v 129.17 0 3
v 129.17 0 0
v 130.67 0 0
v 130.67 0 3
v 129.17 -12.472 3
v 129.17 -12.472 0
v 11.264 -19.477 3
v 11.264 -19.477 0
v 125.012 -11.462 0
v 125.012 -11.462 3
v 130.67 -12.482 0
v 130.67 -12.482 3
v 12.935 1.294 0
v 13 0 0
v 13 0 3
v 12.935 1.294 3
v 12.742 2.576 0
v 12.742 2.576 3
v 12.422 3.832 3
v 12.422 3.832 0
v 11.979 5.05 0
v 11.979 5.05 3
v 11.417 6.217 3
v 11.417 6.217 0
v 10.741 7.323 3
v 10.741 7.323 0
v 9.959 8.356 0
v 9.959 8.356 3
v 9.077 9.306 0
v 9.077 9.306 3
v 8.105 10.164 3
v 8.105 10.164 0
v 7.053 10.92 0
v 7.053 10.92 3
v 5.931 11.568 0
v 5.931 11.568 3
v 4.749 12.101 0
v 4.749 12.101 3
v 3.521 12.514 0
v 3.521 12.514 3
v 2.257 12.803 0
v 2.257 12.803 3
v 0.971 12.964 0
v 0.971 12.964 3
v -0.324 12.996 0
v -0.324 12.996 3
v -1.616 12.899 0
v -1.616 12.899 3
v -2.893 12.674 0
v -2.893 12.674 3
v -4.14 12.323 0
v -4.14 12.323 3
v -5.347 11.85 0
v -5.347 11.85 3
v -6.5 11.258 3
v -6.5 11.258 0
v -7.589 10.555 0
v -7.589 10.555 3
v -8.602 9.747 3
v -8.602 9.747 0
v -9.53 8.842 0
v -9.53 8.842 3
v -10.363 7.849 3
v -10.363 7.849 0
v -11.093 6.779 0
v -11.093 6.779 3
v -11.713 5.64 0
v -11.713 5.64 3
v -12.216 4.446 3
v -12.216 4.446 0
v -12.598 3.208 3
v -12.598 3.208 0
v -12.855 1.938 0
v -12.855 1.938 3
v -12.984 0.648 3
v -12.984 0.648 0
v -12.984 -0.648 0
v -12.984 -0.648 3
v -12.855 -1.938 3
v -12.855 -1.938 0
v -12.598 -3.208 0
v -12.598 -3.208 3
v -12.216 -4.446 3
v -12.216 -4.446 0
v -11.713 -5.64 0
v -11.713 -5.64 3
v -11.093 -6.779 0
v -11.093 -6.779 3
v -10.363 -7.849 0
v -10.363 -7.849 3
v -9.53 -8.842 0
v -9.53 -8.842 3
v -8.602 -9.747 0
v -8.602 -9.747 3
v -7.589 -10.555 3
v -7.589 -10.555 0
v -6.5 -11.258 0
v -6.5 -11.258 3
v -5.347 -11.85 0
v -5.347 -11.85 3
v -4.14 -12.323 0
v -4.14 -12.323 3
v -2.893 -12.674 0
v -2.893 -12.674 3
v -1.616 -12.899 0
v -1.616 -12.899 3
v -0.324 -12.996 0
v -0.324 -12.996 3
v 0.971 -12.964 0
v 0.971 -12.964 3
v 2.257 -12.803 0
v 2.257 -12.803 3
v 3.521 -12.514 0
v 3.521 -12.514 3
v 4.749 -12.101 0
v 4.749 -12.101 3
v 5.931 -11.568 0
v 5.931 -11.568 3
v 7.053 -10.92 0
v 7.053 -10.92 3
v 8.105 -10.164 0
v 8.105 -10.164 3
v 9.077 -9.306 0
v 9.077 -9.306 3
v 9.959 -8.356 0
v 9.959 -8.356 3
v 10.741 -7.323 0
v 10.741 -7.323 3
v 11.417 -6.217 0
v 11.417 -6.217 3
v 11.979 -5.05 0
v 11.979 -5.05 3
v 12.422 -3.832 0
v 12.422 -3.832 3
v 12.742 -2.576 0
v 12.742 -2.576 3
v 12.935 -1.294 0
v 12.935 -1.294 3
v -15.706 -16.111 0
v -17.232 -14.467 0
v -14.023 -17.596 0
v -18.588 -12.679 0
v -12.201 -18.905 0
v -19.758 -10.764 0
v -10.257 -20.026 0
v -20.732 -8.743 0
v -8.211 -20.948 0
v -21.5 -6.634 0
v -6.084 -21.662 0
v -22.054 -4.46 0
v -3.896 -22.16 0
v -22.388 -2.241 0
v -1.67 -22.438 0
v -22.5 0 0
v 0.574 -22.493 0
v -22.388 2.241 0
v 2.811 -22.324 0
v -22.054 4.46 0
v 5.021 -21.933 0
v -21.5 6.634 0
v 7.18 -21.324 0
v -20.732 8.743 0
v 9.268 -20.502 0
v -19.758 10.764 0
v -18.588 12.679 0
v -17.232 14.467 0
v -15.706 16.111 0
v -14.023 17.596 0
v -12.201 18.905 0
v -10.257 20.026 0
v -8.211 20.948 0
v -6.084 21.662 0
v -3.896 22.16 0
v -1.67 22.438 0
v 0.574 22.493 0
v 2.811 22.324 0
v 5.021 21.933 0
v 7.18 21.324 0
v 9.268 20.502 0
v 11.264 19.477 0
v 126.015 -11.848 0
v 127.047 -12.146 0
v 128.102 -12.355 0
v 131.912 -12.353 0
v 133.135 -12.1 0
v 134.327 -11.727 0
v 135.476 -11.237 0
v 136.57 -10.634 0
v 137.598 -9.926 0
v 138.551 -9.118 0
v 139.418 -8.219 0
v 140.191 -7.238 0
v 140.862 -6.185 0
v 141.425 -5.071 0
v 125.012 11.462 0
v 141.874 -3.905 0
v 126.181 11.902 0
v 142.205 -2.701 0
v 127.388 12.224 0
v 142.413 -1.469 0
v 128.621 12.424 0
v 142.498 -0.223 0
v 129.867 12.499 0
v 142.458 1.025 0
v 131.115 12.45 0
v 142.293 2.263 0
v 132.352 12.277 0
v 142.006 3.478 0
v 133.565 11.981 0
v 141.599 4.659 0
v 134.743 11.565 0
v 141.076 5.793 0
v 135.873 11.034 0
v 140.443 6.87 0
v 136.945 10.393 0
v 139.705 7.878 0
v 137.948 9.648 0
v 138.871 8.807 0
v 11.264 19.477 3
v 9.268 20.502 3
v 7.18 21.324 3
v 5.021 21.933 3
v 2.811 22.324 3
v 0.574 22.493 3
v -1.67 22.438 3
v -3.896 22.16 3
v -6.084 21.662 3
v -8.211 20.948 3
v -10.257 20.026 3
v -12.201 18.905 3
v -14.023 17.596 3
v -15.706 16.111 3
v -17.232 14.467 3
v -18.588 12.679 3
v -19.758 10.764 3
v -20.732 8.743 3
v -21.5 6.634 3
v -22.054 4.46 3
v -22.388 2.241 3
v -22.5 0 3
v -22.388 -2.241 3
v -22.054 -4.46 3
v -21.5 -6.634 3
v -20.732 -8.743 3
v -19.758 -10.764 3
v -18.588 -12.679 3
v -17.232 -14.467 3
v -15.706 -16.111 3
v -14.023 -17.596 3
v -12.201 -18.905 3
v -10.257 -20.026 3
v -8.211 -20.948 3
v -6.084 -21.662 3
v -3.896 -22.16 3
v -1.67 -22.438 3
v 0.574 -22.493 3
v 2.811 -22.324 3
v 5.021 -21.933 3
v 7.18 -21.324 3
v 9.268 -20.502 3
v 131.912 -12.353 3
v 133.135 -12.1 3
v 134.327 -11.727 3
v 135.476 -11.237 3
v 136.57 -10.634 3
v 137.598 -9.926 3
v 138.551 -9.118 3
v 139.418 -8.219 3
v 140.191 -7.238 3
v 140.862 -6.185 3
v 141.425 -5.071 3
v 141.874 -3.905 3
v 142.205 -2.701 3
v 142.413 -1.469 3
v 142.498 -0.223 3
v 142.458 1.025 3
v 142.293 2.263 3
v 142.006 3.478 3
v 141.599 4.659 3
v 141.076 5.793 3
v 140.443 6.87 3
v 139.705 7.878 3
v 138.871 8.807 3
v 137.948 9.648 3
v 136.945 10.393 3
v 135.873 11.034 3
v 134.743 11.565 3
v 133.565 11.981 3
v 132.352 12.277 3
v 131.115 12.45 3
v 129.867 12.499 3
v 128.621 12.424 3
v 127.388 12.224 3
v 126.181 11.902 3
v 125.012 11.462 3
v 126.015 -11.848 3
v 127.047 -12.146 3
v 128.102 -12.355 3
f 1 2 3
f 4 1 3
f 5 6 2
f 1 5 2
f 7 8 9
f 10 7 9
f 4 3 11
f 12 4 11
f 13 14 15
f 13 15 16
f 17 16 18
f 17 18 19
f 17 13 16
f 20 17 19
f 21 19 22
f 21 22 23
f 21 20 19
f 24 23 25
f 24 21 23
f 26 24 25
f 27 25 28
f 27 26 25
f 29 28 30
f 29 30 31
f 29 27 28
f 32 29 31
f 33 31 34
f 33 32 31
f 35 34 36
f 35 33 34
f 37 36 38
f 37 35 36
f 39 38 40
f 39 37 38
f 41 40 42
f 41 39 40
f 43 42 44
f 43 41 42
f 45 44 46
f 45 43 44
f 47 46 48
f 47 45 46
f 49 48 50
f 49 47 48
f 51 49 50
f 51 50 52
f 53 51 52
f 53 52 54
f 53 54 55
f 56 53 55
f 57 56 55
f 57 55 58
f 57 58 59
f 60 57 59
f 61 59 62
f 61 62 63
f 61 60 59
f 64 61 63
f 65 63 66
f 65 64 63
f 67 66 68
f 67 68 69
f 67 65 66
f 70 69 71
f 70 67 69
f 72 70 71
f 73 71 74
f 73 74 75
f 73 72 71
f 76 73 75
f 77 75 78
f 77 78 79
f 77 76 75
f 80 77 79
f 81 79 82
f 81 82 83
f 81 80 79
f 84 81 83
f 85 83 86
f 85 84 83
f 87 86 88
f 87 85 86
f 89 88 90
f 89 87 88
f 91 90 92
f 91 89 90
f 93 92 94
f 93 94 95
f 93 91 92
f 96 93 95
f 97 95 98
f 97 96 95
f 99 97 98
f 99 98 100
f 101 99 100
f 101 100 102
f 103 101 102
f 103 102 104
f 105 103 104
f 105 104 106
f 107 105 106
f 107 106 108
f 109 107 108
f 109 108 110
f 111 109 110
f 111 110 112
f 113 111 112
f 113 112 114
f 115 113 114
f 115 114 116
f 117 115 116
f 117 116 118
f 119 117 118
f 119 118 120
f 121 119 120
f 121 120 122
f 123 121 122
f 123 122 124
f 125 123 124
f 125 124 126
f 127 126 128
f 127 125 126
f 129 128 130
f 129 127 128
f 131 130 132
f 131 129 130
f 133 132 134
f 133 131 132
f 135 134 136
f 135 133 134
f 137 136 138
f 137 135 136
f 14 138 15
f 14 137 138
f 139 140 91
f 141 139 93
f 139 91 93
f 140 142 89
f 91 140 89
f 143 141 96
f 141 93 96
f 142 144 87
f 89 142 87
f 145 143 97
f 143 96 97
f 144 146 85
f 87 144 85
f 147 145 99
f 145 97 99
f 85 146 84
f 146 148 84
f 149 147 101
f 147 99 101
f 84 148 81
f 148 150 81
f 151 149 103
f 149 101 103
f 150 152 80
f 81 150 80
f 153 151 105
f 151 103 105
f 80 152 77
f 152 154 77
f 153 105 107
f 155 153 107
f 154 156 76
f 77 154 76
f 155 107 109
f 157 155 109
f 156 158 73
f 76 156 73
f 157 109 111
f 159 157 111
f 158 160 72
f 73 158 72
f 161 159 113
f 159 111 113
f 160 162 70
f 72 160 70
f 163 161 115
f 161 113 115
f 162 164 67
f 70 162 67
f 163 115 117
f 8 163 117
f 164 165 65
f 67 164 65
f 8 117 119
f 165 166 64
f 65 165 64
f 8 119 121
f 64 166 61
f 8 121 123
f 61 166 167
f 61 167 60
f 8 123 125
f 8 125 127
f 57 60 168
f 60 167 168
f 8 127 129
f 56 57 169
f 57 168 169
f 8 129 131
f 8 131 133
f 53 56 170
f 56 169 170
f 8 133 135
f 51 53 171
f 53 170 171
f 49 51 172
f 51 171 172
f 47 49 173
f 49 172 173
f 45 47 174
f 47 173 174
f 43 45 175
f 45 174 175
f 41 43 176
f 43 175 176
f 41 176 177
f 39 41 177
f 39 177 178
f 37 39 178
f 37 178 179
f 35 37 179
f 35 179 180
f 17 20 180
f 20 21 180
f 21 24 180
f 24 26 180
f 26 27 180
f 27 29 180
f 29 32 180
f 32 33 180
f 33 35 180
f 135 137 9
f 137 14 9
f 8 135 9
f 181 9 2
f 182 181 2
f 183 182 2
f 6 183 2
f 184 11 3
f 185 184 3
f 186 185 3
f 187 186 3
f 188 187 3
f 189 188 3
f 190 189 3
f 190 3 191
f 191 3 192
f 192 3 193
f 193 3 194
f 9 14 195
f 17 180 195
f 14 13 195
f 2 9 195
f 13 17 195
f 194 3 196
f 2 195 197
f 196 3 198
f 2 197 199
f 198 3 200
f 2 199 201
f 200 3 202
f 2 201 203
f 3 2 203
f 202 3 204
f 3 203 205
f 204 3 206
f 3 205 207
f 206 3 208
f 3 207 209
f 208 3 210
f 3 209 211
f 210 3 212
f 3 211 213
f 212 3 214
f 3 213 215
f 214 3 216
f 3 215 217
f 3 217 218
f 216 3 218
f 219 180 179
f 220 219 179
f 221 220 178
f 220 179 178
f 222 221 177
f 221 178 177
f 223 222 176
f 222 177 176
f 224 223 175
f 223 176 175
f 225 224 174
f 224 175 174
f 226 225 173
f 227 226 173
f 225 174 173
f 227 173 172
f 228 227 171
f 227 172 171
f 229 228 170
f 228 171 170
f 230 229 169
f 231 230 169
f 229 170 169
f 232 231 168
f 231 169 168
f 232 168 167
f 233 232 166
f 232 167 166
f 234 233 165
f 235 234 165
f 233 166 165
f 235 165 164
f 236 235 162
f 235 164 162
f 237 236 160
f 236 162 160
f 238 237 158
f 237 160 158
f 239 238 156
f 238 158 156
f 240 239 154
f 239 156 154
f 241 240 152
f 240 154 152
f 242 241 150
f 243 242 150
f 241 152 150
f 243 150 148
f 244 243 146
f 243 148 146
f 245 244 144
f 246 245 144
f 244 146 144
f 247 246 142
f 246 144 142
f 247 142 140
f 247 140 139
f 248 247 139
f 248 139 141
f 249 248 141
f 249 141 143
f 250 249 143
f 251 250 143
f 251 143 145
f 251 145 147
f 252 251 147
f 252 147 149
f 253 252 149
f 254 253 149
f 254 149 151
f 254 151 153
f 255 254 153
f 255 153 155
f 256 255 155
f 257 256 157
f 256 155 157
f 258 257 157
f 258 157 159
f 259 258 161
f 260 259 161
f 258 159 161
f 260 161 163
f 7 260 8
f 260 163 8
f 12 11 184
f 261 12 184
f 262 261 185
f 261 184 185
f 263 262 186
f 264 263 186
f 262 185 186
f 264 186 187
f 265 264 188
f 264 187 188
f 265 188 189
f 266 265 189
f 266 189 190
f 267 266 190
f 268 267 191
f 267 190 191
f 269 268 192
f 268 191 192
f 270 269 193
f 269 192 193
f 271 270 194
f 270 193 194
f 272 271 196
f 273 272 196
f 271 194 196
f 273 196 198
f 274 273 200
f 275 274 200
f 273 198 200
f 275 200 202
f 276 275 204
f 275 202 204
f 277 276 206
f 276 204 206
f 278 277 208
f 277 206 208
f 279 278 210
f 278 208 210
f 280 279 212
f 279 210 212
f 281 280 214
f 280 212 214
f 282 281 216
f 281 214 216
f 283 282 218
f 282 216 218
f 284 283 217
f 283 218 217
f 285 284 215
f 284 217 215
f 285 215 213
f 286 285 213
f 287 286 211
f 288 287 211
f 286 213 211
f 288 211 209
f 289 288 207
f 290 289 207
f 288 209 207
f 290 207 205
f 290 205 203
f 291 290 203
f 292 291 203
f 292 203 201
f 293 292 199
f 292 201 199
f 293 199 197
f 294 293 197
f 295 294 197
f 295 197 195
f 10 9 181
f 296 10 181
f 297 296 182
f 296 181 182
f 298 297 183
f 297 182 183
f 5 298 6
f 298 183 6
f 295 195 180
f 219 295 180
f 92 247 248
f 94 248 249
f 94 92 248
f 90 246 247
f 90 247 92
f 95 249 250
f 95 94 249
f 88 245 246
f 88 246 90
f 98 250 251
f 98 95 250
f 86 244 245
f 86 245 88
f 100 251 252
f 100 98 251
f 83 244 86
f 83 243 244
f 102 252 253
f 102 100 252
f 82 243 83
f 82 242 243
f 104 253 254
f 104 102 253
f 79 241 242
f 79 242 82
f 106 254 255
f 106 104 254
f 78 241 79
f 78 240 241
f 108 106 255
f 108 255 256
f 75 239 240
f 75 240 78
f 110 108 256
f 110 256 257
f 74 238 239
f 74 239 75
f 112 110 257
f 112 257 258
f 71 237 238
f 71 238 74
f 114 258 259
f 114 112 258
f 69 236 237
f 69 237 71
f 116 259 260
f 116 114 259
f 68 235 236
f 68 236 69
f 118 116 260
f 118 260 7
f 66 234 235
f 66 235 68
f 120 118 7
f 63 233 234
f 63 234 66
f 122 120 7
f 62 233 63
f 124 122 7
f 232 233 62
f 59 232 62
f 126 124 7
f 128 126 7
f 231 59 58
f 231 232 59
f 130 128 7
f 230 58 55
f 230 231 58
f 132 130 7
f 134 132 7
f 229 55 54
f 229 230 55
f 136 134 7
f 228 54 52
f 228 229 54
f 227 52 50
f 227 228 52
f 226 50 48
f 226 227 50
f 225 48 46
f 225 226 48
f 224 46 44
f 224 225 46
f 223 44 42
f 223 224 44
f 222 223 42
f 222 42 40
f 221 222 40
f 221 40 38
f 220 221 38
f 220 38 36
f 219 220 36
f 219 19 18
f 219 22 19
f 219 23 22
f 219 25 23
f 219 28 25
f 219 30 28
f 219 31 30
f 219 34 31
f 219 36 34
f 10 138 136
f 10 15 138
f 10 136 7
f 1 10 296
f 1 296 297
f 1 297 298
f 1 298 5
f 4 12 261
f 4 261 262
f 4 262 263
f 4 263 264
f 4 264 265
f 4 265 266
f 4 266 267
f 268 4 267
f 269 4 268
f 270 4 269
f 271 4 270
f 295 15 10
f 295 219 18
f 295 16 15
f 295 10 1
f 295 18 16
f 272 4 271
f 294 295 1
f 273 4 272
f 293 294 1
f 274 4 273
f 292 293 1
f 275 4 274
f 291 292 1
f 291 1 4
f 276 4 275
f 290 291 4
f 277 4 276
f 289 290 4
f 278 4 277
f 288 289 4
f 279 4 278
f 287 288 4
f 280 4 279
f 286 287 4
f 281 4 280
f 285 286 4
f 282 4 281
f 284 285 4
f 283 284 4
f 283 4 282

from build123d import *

# Parameters (mm, degrees)
SKETCH1_R           = 13
BOSS_EXTRUDE1_DEPTH = 3


with BuildPart() as part:
    # Sketch1 → Boss-Extrude1 (new body)
    with BuildSketch(Plane.XY):
        with BuildLine():
            Line((125.012278301, 11.461790098), (11.264435627, 19.47723004))
            ThreePointArc((11.264435627, 19.47723004), (-22.5, 0), (11.264435627, -19.47723004))
            Line((11.264435627, -19.47723004), (125.012278301, -11.461790098))
            ThreePointArc((125.012278301, -11.461790098), (127.047433933, -12.146289706), (129.169709598, -12.472394231))
            Line((129.169709598, -12.472394231), (129.169709598, 0))
            Line((129.169709598, 0), (130.669709598, 0))
            Line((130.669709598, 0), (130.669709598, -12.482046669))
            ThreePointArc((130.669709598, -12.482046669), (142.165037481, 2.87434568), (125.012278301, 11.461790098))
        make_face()
        Circle(SKETCH1_R, mode=Mode.SUBTRACT)
    extrude(amount=BOSS_EXTRUDE1_DEPTH)


solid = part.part
